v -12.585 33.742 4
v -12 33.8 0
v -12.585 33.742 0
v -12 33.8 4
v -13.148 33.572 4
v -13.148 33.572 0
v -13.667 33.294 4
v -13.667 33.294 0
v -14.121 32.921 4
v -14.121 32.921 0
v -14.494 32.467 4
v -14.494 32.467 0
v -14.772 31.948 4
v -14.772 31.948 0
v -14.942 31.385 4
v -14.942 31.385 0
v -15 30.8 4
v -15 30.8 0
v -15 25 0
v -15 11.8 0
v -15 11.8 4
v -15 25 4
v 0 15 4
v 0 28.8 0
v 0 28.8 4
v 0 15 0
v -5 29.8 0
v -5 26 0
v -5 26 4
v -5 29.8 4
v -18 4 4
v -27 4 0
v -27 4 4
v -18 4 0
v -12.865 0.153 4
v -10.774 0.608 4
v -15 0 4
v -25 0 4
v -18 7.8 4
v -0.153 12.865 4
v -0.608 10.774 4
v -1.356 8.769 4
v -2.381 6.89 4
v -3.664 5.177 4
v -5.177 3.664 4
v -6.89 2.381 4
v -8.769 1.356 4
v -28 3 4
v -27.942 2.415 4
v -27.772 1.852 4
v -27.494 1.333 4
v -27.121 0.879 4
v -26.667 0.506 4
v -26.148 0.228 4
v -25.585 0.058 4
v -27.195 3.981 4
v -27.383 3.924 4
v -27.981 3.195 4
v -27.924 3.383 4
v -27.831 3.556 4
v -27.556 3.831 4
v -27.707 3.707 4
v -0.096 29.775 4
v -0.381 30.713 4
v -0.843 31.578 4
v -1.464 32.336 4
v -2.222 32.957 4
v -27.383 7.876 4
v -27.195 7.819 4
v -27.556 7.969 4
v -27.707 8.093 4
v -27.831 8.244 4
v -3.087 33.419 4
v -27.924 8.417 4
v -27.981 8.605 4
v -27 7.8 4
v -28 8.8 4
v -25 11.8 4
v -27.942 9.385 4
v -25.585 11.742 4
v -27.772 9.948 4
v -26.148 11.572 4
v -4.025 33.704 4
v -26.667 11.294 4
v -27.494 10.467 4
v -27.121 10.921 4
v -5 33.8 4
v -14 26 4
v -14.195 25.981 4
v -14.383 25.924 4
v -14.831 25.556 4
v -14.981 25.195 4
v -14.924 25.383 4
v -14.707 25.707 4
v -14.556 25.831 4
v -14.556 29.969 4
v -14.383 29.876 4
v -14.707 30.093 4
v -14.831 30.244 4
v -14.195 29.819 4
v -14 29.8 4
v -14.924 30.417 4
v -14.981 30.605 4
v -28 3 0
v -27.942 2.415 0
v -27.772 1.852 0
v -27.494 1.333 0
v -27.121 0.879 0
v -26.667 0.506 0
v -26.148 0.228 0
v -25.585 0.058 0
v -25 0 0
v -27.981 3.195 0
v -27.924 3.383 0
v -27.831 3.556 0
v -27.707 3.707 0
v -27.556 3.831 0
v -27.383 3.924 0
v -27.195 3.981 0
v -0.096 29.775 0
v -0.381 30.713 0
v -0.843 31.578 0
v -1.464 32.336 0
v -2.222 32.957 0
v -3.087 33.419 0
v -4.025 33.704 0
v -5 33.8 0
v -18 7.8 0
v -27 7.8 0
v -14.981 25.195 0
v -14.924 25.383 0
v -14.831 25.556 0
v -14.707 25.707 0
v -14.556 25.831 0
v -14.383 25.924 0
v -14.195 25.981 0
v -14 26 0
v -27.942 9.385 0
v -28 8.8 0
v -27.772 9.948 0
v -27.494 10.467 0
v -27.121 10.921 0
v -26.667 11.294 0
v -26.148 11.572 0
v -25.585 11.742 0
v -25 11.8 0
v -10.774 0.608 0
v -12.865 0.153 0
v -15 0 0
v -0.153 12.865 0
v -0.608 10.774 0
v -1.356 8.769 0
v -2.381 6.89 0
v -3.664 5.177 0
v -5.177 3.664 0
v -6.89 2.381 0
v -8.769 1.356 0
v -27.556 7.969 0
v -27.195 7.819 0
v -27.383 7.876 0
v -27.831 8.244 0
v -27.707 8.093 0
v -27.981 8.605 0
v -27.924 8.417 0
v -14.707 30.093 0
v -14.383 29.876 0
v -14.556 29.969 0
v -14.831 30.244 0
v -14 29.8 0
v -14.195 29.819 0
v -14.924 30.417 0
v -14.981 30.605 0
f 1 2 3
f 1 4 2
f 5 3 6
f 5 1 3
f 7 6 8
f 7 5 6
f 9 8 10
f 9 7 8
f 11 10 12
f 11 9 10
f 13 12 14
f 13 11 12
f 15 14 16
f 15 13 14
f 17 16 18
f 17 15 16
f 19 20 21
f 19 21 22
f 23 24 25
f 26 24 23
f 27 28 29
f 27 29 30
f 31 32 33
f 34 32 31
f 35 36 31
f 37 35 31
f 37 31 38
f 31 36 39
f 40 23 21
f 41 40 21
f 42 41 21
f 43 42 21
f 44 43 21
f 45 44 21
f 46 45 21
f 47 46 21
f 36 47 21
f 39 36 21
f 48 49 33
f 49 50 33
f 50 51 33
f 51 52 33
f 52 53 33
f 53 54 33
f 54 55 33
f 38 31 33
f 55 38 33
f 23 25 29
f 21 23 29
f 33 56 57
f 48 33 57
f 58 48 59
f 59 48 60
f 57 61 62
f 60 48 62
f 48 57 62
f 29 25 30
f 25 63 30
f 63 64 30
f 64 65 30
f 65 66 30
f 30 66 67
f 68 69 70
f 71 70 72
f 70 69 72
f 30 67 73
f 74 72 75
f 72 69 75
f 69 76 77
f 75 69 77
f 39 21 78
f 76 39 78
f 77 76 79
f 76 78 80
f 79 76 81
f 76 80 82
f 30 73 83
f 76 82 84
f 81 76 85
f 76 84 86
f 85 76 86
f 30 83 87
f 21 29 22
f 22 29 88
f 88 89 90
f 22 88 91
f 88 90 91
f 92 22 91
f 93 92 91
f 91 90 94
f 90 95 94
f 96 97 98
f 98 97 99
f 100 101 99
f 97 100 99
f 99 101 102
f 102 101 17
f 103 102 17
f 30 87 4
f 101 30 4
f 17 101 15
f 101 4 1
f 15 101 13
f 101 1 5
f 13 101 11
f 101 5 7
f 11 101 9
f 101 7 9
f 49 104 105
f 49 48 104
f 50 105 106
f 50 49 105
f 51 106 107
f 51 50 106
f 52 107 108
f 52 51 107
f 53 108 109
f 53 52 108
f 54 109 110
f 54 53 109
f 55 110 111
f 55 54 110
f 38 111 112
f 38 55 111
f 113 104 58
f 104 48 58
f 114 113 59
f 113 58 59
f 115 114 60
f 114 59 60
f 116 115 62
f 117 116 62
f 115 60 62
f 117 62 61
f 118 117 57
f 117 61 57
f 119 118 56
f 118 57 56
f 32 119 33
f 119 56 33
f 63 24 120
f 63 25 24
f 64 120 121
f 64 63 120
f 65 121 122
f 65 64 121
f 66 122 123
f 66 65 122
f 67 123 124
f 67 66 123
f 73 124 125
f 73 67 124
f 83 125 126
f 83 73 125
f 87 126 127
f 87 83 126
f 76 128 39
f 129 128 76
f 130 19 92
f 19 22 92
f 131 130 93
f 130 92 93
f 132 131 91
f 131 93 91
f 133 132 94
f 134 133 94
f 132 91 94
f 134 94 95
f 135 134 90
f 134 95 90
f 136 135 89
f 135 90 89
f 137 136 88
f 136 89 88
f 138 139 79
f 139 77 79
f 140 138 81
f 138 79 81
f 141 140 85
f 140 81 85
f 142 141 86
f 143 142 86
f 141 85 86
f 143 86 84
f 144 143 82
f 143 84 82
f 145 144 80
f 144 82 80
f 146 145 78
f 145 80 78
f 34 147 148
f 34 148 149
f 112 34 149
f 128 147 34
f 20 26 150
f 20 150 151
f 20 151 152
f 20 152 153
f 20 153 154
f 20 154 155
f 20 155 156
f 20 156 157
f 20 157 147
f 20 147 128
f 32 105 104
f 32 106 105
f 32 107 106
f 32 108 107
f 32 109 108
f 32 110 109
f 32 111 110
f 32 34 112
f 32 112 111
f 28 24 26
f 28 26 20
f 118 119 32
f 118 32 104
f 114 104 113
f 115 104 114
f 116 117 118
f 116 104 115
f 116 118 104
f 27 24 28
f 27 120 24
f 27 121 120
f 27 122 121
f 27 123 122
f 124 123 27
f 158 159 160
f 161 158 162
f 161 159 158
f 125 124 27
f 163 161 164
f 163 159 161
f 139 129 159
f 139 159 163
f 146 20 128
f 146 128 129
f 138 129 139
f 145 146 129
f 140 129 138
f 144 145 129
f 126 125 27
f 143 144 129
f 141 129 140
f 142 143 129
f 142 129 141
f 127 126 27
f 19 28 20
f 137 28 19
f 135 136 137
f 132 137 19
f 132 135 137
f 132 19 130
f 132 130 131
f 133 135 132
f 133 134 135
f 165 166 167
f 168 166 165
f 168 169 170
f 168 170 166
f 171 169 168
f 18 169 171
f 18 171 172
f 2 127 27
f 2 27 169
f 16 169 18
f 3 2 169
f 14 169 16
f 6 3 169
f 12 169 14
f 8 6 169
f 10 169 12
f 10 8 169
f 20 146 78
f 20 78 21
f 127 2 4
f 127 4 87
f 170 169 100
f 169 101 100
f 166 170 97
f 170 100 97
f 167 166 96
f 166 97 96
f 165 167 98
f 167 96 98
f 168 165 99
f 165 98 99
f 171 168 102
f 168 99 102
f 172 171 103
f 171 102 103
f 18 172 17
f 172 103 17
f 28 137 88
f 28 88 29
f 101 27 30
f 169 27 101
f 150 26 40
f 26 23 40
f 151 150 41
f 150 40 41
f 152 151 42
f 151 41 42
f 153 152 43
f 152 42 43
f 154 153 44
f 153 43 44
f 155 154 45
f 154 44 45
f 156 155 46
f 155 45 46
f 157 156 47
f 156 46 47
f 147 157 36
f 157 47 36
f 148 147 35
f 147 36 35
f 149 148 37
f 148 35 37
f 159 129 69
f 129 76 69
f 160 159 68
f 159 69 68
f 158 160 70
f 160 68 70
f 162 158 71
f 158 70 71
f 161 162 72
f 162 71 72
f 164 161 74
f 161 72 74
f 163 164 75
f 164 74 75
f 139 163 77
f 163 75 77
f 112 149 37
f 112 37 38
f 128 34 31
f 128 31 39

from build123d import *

# Parameters (mm, degrees)
ESTRUSIONE_ESTRUSIONE1_DEPTH = 4
RACCORDO1_R                  = 1
RACCORDO2_R                  = 3
RACCORDO3_R                  = 5
RACCORDO4_R                  = 15


with BuildPart() as part:
    # Schizzo1 → Estrusione-Estrusione1 (new body)
    with BuildSketch(Plane.XY):
        Polygon((-15, 33.8), (0, 33.8), (0, 0), (-28, 0), (-28, 4), (-18, 4), (-18, 7.8), (-28, 7.8), (-28, 11.8), (-15, 11.8), (-15, 26), (-5, 26), (-5, 29.8), (-15, 29.8), align=None)
    extrude(amount=ESTRUSIONE_ESTRUSIONE1_DEPTH)

    # Raccordo1
    raccordo1_edges = [part.edges().sort_by_distance(p)[0] for p in [
        (-28, 4, 2),
        (-28, 7.8, 2),
        (-15, 26, 2),
        (-15, 29.8, 2),
    ]]
    fillet(raccordo1_edges, radius=RACCORDO1_R)

    # Raccordo2
    raccordo2_edges = [part.edges().sort_by_distance(p)[0] for p in [
        (-28, 0, 2),
        (-28, 11.8, 2),
        (-15, 33.8, 2),
    ]]
    fillet(raccordo2_edges, radius=RACCORDO2_R - 0.0001)  # a hair under: the kernel refuses the full size

    # Raccordo3
    raccordo3_edges = [part.edges().sort_by_distance(p)[0] for p in [
        (0, 33.8, 2),
    ]]
    fillet(raccordo3_edges, radius=RACCORDO3_R)

    # Raccordo4
    raccordo4_edges = [part.edges().sort_by_distance(p)[0] for p in [
        (0, 0, 2),
    ]]
    fillet(raccordo4_edges, radius=RACCORDO4_R)


solid = part.part
